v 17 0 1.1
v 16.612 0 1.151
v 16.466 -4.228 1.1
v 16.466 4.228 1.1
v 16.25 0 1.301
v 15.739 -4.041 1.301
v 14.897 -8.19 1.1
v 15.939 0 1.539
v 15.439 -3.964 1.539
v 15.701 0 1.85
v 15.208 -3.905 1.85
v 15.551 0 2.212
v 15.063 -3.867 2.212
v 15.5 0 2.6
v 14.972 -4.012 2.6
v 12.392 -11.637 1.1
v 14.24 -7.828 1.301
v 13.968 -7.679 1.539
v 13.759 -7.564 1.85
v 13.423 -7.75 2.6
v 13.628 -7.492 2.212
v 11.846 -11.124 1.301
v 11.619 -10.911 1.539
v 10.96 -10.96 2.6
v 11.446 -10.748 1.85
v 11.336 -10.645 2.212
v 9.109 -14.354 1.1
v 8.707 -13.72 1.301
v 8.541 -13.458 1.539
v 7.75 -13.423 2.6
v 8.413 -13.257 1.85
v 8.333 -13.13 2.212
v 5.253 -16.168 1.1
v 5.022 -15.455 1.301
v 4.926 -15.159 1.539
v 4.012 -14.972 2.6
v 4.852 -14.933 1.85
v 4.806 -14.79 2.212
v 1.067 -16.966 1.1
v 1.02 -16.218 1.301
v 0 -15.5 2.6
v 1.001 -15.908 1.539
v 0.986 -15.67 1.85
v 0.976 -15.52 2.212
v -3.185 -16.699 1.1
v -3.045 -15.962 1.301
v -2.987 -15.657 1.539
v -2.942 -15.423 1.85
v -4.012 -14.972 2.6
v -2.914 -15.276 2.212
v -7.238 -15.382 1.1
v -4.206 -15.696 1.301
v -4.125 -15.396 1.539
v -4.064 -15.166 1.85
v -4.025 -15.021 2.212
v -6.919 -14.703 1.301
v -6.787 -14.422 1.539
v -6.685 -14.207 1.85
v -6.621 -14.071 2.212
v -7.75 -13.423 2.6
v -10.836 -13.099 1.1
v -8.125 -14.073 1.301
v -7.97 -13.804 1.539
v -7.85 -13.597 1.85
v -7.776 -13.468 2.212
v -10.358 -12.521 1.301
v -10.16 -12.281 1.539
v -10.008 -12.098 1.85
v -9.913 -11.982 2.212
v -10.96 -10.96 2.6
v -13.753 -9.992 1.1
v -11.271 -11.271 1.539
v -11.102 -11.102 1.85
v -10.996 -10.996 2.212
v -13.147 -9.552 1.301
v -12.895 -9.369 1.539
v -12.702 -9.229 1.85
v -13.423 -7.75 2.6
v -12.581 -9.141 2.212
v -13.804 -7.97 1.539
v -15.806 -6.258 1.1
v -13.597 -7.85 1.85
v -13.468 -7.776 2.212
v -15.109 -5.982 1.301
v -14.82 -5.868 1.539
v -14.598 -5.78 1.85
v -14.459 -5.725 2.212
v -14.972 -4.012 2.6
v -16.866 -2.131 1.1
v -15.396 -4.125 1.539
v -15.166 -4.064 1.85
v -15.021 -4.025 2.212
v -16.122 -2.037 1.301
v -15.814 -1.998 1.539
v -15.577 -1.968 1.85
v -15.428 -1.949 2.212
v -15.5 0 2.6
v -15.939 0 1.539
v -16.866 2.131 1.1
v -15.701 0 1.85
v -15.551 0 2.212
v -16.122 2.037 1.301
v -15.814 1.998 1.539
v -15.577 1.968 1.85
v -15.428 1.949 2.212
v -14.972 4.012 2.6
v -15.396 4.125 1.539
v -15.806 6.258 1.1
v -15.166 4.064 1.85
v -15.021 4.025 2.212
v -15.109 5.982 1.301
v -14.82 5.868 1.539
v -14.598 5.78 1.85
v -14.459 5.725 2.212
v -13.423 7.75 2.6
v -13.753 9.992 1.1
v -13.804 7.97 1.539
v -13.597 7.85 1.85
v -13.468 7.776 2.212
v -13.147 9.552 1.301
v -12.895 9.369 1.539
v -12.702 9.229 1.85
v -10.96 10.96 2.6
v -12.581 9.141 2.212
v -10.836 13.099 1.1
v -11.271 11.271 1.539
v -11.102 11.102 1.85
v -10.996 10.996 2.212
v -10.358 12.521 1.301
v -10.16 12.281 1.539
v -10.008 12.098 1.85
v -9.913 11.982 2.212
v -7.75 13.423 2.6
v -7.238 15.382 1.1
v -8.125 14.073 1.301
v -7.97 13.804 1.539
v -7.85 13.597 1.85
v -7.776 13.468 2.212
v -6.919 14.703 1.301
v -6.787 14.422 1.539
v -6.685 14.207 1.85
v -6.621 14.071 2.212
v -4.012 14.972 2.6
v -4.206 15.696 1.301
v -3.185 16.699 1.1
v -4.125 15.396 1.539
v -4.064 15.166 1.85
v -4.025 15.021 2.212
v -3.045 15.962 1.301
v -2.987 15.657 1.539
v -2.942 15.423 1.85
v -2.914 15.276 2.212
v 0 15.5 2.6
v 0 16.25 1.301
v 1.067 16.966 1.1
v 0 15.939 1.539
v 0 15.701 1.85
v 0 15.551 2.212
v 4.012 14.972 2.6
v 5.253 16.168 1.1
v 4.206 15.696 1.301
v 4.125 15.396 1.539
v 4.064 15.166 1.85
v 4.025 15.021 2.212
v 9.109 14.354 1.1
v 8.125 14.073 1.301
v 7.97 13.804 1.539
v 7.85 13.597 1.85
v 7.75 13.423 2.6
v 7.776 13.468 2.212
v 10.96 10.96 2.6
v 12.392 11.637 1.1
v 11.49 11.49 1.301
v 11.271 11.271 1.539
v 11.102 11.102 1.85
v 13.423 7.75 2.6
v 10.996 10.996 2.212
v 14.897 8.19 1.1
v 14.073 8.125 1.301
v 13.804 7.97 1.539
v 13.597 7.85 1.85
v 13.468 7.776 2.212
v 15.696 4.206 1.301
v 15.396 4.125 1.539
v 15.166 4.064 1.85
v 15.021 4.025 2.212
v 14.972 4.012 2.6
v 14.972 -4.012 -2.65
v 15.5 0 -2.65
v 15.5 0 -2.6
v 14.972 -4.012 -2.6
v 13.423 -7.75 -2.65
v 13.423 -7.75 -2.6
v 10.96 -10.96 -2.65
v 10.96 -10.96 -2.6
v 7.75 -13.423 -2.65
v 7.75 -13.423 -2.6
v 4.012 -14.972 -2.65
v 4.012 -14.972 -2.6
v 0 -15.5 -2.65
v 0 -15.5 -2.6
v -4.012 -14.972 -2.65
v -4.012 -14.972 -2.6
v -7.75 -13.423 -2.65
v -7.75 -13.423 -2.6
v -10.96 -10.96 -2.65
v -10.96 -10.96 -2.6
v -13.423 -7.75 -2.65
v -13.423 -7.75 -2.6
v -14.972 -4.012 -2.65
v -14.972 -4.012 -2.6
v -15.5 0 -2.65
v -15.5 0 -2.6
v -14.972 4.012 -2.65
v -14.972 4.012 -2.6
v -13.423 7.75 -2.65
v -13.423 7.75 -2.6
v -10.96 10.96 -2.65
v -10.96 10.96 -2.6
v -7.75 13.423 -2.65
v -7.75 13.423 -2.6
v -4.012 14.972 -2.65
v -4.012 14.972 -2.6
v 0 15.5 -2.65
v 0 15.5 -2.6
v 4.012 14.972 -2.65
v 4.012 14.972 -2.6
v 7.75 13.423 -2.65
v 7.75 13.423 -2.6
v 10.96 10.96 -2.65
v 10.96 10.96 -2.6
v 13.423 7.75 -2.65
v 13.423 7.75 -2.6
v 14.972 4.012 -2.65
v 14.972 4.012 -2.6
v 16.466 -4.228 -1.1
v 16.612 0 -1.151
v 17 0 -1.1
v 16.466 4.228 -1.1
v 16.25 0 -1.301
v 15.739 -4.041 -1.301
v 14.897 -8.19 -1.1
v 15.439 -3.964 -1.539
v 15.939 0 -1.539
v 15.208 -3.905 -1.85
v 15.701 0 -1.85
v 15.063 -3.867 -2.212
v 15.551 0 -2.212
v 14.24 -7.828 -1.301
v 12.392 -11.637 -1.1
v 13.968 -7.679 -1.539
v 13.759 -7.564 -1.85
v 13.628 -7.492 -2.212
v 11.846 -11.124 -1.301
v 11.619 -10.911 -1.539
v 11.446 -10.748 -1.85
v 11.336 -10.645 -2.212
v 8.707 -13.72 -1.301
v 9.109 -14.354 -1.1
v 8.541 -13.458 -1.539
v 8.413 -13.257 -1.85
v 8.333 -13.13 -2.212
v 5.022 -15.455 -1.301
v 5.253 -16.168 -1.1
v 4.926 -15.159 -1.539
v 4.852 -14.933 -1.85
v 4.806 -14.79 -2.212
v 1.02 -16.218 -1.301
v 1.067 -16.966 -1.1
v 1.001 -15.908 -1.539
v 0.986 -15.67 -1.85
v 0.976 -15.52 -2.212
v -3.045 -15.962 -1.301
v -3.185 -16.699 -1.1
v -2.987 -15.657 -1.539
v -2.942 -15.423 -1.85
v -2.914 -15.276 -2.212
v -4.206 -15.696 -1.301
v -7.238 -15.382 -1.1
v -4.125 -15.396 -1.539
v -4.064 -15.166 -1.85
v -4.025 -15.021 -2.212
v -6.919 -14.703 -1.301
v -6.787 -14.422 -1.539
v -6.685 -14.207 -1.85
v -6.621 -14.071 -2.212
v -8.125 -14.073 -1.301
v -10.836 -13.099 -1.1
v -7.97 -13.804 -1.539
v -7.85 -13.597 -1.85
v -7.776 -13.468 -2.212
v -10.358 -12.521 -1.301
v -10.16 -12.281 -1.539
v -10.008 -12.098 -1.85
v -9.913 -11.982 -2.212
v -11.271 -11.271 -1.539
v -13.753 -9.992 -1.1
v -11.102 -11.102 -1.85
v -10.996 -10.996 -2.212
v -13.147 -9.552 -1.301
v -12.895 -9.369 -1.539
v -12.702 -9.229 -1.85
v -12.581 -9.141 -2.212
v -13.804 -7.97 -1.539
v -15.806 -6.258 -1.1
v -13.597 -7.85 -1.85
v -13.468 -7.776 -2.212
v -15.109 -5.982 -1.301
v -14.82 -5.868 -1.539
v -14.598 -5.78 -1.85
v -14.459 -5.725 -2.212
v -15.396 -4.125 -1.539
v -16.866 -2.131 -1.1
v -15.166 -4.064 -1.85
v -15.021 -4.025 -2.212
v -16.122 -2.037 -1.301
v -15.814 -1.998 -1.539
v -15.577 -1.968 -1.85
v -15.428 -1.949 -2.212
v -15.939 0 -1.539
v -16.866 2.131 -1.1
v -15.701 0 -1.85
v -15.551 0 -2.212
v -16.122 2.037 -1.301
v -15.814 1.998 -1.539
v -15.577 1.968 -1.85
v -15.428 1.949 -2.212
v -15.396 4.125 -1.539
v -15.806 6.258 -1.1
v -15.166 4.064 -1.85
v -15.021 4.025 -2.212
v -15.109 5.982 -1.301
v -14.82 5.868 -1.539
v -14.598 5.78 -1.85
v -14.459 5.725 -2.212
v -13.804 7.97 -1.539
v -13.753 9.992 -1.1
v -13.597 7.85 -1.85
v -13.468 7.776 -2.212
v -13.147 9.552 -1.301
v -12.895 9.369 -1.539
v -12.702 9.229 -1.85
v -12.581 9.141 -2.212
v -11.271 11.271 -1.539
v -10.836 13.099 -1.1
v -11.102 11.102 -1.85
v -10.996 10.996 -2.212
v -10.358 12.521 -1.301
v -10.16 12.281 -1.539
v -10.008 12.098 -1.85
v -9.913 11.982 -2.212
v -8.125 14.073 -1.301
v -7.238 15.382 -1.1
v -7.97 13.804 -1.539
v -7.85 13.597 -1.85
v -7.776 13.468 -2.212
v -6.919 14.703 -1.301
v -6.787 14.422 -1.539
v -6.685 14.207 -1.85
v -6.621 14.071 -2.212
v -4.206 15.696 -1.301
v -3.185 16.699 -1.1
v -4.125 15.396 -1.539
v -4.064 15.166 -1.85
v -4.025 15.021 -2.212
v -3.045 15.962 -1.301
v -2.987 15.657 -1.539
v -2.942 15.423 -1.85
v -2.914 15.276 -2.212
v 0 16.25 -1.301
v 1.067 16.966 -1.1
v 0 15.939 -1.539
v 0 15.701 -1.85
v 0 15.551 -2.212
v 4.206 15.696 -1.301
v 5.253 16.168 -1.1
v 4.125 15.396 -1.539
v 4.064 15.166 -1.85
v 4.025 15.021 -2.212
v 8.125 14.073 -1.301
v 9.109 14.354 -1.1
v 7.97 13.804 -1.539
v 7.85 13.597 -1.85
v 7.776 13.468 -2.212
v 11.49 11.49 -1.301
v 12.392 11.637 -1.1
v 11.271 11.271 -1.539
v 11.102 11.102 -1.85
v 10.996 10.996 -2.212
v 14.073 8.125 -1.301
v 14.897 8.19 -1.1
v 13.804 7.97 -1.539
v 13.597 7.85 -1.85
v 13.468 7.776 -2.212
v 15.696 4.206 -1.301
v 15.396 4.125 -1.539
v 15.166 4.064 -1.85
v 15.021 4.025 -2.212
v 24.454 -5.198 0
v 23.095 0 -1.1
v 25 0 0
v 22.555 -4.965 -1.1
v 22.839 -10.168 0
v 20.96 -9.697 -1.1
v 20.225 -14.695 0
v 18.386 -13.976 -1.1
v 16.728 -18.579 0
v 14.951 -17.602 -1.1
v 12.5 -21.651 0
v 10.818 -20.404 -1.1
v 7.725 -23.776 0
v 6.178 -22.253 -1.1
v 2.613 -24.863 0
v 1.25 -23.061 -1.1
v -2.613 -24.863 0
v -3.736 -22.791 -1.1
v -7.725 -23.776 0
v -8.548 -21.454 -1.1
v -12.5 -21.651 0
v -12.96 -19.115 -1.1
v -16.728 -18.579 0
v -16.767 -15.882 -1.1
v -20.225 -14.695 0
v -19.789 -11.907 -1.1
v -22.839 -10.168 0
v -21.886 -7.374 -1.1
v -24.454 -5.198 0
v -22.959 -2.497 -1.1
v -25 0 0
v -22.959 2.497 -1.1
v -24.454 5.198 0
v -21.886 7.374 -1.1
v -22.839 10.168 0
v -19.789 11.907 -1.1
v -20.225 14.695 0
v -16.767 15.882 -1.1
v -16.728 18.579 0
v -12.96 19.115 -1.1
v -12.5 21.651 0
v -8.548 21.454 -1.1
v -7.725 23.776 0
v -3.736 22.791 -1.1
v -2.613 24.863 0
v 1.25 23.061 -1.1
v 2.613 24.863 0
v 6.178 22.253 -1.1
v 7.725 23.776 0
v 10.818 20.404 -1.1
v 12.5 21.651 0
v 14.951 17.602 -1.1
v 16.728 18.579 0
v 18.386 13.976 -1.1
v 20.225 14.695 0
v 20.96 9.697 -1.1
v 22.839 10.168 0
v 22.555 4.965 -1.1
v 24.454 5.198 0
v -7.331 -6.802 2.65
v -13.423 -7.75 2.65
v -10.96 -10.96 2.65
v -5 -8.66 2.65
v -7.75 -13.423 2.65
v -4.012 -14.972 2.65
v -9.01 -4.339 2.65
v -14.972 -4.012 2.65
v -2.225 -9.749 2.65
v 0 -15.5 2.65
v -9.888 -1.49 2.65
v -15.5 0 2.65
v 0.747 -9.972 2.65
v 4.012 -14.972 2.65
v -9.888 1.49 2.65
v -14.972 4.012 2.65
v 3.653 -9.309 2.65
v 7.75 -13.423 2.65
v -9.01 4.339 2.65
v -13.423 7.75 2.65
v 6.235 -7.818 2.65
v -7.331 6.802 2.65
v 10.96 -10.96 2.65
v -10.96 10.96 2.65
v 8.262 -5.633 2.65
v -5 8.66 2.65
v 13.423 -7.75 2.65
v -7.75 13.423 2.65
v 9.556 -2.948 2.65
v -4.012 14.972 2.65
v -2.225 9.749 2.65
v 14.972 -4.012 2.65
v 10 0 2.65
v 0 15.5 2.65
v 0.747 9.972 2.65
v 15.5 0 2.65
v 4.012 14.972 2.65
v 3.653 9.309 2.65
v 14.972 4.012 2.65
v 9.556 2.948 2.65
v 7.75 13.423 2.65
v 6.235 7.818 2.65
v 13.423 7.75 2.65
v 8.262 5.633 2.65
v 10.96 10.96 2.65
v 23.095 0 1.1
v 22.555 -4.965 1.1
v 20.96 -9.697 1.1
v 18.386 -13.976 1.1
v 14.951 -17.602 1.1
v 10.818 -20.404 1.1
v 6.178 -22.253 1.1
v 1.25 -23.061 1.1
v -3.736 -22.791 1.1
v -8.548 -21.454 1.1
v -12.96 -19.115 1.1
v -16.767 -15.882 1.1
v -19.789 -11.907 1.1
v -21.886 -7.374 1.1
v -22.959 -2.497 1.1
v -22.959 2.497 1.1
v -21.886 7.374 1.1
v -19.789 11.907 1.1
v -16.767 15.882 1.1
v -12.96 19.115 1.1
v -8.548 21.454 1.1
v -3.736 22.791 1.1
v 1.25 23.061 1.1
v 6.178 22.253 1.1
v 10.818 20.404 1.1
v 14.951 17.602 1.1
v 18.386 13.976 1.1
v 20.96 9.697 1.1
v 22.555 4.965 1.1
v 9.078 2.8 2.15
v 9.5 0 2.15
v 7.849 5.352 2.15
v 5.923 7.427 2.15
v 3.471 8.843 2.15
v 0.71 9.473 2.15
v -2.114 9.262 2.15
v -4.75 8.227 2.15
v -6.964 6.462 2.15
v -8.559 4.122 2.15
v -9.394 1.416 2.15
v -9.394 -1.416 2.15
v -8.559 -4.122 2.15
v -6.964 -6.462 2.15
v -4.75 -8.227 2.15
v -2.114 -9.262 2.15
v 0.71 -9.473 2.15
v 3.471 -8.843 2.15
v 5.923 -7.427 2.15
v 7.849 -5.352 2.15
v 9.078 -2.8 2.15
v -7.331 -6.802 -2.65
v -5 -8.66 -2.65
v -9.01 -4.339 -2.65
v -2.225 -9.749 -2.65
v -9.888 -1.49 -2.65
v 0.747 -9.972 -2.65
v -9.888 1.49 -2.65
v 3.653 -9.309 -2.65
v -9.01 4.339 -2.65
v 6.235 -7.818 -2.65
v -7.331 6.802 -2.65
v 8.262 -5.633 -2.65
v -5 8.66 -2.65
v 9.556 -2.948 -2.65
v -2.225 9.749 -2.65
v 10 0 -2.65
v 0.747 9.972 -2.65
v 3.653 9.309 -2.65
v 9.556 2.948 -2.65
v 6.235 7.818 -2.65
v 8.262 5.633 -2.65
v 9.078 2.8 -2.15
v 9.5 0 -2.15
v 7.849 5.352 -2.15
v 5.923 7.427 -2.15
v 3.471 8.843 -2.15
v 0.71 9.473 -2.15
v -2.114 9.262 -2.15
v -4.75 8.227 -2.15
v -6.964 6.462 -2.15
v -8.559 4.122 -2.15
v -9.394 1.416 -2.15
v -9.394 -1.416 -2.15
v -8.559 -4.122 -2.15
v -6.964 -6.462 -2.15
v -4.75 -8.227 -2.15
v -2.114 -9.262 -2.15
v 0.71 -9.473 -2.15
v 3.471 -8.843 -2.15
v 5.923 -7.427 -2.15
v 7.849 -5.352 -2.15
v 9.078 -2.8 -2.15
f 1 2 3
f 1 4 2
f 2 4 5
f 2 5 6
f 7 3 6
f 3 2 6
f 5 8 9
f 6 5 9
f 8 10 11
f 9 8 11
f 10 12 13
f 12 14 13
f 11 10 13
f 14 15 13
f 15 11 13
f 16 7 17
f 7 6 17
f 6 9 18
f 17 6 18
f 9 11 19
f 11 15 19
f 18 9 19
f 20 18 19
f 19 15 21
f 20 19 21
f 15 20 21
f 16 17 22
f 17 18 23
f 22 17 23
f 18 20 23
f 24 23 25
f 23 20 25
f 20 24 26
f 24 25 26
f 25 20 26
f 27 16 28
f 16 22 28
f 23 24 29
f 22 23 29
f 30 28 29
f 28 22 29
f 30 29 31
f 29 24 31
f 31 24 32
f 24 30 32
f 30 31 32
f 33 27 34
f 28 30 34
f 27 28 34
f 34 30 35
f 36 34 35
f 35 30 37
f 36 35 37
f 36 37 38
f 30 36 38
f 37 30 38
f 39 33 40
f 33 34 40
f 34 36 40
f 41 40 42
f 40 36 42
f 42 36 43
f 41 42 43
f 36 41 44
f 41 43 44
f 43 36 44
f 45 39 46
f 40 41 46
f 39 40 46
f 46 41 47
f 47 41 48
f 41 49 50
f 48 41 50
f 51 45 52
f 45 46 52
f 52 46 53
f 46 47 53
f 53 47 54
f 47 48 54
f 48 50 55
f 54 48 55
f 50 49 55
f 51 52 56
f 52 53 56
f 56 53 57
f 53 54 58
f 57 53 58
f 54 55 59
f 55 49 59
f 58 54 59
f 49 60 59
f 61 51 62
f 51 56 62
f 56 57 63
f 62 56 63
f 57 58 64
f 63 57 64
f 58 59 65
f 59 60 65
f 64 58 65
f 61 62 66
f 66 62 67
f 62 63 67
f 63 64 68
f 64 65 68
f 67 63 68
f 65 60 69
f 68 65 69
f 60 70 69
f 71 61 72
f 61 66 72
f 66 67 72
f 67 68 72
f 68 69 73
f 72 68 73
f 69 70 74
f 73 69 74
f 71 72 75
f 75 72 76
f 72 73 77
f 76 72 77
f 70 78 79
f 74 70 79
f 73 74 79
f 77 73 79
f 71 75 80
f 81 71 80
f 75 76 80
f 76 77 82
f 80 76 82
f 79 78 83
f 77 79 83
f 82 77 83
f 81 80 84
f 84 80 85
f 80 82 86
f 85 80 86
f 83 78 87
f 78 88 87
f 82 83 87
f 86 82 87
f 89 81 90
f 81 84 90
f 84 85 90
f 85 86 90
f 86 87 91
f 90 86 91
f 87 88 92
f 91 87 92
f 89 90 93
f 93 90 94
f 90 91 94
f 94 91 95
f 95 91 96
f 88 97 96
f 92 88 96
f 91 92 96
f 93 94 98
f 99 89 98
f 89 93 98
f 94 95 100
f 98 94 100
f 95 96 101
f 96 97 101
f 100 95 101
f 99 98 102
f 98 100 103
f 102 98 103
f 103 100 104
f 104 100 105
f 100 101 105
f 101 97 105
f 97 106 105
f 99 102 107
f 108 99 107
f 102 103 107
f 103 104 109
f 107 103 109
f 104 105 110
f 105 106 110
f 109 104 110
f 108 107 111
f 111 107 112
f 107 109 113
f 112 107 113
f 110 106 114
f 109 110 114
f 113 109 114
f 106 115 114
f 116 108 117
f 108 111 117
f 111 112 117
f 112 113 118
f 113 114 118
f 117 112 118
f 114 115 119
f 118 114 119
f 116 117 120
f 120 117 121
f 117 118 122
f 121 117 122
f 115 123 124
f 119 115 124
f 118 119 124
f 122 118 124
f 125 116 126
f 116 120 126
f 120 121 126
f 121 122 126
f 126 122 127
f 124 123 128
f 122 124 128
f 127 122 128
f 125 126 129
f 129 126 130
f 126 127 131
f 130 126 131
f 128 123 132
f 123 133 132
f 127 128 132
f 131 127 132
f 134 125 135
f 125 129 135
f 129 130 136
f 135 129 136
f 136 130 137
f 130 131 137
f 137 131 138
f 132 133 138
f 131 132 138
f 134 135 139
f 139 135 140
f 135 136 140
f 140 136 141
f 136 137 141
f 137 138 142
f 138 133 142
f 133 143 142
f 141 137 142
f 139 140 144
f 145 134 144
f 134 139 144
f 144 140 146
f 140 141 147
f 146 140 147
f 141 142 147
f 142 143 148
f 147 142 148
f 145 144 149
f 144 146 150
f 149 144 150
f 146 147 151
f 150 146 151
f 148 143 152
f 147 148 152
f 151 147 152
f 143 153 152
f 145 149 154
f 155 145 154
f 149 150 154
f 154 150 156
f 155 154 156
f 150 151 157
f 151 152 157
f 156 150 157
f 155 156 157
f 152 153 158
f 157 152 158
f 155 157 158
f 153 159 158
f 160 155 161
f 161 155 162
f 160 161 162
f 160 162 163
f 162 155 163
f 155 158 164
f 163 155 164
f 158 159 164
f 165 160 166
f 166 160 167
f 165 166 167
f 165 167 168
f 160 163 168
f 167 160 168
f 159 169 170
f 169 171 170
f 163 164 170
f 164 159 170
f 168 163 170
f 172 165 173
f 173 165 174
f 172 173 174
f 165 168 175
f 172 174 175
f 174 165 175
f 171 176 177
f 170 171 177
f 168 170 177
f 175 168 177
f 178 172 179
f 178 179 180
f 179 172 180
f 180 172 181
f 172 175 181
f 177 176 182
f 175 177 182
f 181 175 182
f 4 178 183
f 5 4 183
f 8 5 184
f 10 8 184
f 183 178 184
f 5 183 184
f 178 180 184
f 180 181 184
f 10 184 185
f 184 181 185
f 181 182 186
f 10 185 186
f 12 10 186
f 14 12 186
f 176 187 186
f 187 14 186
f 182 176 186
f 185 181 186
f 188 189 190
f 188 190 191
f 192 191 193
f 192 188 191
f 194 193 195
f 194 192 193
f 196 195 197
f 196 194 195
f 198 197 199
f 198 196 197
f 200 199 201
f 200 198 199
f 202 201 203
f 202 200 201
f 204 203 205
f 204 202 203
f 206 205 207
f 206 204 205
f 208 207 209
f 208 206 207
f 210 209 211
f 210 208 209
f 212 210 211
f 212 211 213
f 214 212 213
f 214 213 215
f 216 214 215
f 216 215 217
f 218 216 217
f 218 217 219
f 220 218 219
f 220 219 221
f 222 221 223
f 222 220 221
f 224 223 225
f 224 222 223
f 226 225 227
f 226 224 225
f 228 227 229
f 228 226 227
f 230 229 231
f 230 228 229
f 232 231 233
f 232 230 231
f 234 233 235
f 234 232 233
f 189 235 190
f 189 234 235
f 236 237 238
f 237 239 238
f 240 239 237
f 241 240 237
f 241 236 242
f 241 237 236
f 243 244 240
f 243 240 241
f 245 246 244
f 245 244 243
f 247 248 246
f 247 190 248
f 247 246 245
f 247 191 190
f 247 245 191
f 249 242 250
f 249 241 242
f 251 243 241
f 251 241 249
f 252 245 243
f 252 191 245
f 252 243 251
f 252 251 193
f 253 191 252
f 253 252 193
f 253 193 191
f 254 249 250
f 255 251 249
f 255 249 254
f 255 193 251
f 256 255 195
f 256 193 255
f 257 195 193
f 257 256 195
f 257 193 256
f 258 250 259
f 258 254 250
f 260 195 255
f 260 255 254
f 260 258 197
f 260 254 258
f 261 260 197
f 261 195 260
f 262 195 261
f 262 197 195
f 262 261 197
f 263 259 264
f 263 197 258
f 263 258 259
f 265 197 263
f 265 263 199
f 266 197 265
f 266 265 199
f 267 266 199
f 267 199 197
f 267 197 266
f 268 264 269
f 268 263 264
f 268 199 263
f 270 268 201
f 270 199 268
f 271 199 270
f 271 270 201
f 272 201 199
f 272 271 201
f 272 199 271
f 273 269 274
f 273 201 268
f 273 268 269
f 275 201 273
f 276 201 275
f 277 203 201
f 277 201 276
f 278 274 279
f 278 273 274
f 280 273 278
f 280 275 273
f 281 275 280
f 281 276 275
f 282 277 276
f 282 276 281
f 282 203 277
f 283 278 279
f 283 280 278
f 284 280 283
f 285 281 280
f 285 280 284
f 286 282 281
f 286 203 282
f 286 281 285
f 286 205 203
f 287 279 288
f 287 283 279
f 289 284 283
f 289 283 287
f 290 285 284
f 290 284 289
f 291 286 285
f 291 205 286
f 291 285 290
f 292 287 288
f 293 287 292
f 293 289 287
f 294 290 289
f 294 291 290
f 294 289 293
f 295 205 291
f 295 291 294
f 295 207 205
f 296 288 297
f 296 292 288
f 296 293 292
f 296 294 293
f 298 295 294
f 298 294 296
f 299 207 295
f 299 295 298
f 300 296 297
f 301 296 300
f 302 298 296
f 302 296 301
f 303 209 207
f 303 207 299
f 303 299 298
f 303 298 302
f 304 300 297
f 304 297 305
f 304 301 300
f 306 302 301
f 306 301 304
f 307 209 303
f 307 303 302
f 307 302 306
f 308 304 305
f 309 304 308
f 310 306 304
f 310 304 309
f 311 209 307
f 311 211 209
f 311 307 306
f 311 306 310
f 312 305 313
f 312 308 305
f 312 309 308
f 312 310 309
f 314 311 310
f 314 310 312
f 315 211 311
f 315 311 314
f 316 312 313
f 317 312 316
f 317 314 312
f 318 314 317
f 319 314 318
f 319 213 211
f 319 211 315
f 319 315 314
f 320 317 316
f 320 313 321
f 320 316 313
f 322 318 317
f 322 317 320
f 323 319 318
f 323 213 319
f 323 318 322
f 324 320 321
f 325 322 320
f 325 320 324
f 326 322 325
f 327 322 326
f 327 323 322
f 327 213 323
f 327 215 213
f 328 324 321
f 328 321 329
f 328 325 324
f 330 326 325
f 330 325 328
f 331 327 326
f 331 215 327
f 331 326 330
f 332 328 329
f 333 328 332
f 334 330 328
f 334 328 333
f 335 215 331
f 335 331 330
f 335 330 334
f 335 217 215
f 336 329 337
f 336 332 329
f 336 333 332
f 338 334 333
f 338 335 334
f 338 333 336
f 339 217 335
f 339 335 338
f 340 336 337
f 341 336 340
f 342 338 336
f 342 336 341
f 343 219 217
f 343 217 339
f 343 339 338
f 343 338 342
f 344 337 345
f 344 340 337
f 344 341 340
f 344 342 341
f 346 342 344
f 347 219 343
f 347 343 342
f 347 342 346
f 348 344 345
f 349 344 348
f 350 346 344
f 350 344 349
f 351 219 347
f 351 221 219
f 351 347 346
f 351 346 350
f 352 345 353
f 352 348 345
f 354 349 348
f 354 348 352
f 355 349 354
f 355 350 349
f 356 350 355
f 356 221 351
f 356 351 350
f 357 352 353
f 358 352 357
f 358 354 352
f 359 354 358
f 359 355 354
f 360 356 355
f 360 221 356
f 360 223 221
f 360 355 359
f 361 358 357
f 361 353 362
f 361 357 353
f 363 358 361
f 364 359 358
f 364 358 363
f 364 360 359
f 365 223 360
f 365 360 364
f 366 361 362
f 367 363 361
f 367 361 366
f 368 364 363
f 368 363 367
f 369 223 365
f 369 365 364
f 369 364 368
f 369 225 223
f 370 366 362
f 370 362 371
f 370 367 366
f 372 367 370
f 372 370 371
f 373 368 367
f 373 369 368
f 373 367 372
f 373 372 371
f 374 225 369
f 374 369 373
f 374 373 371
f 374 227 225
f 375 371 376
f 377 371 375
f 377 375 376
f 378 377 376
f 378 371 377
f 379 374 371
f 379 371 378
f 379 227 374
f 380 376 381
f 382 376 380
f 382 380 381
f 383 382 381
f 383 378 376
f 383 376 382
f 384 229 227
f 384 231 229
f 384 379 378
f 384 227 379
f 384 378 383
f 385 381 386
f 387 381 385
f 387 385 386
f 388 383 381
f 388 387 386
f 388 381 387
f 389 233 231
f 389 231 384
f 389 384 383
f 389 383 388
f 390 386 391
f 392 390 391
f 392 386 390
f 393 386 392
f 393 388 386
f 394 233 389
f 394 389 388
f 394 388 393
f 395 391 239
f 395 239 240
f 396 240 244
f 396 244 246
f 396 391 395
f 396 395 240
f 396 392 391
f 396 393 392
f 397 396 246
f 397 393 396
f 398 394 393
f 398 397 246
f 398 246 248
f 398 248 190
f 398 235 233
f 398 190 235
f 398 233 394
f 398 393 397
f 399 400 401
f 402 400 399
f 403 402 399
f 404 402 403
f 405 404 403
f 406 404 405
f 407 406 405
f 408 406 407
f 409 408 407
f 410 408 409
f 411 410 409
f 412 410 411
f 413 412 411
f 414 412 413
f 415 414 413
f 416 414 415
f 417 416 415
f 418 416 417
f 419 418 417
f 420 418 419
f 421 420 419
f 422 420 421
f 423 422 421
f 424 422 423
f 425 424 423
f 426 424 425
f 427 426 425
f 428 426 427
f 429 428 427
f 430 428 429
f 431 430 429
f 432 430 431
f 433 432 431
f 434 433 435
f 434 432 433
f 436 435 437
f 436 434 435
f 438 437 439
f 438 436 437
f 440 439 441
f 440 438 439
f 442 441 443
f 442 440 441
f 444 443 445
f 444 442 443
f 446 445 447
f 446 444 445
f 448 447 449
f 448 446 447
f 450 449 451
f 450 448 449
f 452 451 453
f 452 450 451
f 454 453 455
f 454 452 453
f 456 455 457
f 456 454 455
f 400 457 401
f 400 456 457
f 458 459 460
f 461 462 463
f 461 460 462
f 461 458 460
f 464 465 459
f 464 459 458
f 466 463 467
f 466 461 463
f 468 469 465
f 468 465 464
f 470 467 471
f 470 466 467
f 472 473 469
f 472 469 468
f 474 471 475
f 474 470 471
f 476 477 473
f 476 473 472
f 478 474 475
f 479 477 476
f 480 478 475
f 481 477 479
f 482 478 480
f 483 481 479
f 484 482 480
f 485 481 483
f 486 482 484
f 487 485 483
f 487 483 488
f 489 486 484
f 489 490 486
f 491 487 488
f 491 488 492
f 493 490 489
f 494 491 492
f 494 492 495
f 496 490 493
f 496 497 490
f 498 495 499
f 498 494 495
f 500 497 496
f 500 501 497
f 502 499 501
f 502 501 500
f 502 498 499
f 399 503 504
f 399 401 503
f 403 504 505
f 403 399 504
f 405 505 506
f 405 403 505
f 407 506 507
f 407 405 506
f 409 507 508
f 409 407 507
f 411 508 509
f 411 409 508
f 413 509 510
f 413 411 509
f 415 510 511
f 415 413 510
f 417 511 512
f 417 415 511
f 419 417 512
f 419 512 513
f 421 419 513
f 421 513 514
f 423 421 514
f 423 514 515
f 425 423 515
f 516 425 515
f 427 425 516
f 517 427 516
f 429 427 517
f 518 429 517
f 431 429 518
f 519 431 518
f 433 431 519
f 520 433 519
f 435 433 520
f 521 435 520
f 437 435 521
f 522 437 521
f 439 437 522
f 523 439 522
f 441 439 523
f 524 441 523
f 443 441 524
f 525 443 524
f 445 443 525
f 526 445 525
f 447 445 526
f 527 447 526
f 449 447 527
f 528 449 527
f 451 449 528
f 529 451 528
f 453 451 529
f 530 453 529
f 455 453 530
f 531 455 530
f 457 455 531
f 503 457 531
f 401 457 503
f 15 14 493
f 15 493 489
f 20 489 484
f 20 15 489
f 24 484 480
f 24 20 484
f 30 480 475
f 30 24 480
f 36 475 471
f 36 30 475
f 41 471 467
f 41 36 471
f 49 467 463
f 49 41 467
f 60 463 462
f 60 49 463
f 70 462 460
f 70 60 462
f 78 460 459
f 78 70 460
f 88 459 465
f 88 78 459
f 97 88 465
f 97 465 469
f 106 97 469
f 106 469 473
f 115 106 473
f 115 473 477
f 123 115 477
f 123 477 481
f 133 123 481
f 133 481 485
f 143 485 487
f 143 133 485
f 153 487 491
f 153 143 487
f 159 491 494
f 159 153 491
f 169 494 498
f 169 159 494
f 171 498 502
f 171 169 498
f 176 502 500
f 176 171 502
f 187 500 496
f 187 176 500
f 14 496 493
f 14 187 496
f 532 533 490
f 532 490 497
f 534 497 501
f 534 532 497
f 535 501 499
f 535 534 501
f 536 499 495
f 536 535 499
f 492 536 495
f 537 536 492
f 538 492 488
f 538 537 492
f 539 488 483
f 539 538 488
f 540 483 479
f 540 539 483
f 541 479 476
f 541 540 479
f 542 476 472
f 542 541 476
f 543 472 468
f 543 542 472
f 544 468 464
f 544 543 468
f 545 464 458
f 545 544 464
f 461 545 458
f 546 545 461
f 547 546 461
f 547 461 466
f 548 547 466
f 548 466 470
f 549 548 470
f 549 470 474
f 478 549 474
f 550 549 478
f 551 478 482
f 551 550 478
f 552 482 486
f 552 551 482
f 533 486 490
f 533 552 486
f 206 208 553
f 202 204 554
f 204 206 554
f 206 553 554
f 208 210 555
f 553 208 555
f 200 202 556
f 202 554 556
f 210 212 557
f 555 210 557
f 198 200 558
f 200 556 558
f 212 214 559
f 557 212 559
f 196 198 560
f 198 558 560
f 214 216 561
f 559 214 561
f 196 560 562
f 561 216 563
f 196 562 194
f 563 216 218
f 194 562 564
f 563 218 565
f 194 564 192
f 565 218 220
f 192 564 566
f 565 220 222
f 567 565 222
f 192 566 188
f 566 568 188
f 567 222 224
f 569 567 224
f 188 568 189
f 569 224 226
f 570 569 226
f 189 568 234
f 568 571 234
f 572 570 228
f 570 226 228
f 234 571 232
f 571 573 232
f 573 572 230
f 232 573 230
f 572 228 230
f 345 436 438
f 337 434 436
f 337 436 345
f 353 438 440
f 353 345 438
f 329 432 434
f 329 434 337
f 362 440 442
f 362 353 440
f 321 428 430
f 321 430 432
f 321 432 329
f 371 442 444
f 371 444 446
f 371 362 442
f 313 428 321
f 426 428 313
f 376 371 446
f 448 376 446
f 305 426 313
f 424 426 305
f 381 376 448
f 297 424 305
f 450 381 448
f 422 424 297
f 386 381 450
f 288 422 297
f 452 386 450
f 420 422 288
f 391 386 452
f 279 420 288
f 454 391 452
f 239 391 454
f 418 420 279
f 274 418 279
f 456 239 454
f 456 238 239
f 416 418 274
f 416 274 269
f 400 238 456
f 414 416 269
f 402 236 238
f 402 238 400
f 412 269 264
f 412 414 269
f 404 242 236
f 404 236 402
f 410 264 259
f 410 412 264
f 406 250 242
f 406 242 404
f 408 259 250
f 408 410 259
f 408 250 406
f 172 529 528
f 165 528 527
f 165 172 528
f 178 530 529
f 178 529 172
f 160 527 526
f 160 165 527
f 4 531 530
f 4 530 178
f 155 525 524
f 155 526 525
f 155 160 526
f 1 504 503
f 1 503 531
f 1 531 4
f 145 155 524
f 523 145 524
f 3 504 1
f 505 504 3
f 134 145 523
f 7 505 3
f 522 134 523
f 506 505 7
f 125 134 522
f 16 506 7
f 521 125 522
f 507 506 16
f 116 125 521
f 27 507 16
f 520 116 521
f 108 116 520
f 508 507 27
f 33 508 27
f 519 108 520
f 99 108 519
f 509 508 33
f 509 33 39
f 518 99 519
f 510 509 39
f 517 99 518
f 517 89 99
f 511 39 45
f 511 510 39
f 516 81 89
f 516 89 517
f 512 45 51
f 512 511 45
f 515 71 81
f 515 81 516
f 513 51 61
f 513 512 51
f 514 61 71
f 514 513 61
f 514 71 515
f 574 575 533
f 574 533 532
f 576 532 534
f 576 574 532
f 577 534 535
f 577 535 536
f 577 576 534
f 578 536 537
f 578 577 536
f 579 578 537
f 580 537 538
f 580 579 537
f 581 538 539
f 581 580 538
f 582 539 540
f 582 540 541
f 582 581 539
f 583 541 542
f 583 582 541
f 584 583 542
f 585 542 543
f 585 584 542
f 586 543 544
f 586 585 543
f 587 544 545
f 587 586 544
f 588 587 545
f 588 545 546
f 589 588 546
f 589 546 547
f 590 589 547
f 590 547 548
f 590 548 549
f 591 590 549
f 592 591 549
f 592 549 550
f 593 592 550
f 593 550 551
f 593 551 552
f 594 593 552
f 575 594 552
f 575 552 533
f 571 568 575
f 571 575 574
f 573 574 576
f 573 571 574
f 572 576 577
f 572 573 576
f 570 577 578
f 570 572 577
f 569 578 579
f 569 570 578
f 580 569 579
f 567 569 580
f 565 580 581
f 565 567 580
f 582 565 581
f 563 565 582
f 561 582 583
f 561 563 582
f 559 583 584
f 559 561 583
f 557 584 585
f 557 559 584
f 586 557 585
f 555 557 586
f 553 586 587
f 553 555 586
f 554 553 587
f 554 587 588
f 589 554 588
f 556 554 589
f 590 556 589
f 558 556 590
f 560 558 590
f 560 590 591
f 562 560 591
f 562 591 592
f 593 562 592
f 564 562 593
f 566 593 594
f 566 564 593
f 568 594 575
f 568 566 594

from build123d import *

# Parameters (mm, degrees)
F0_R     = 25
F0_R_2   = 9.5
F1_DEPTH = 2.65
F4_R     = 1.5
F5_SIZE  = 0.5


with BuildPart() as f1:
    # F0 (on Top) → F1 (new body, symmetric)
    with BuildSketch(Plane.XY):
        Circle(F0_R)
        Circle(F0_R_2, mode=Mode.SUBTRACT)
    extrude(amount=F1_DEPTH, both=True)

    # F2 (on Front) → F3 (revolve, cut)
    with BuildSketch(Plane.XZ):
        Polygon((42.872044, 12.488453), (15.5, 2.65), (15.5, 1.1), (23.094744, 1.1), (25, 0), (23.094744, -1.1), (15.5, -1.1), (15.5, -2.672665), (42.872044, -11.621938), align=None)
    revolve(axis=Axis((0, 0, -3.257056), (0, 0, -1)), mode=Mode.SUBTRACT)

    # F4
    f4_edges = [f1.edges().sort_by_distance(p)[0] for p in [
        (-15.5, 0, 1.1),
        (-15.5, 0, -1.1),
    ]]
    fillet(f4_edges, radius=F4_R)

    # F5
    f5_edges = [f1.edges().sort_by_distance(p)[0] for p in [
        (-9.5, 0, 2.65),
        (-9.5, 0, -2.65),
    ]]
    chamfer(f5_edges, length=F5_SIZE)


solid = f1.part
